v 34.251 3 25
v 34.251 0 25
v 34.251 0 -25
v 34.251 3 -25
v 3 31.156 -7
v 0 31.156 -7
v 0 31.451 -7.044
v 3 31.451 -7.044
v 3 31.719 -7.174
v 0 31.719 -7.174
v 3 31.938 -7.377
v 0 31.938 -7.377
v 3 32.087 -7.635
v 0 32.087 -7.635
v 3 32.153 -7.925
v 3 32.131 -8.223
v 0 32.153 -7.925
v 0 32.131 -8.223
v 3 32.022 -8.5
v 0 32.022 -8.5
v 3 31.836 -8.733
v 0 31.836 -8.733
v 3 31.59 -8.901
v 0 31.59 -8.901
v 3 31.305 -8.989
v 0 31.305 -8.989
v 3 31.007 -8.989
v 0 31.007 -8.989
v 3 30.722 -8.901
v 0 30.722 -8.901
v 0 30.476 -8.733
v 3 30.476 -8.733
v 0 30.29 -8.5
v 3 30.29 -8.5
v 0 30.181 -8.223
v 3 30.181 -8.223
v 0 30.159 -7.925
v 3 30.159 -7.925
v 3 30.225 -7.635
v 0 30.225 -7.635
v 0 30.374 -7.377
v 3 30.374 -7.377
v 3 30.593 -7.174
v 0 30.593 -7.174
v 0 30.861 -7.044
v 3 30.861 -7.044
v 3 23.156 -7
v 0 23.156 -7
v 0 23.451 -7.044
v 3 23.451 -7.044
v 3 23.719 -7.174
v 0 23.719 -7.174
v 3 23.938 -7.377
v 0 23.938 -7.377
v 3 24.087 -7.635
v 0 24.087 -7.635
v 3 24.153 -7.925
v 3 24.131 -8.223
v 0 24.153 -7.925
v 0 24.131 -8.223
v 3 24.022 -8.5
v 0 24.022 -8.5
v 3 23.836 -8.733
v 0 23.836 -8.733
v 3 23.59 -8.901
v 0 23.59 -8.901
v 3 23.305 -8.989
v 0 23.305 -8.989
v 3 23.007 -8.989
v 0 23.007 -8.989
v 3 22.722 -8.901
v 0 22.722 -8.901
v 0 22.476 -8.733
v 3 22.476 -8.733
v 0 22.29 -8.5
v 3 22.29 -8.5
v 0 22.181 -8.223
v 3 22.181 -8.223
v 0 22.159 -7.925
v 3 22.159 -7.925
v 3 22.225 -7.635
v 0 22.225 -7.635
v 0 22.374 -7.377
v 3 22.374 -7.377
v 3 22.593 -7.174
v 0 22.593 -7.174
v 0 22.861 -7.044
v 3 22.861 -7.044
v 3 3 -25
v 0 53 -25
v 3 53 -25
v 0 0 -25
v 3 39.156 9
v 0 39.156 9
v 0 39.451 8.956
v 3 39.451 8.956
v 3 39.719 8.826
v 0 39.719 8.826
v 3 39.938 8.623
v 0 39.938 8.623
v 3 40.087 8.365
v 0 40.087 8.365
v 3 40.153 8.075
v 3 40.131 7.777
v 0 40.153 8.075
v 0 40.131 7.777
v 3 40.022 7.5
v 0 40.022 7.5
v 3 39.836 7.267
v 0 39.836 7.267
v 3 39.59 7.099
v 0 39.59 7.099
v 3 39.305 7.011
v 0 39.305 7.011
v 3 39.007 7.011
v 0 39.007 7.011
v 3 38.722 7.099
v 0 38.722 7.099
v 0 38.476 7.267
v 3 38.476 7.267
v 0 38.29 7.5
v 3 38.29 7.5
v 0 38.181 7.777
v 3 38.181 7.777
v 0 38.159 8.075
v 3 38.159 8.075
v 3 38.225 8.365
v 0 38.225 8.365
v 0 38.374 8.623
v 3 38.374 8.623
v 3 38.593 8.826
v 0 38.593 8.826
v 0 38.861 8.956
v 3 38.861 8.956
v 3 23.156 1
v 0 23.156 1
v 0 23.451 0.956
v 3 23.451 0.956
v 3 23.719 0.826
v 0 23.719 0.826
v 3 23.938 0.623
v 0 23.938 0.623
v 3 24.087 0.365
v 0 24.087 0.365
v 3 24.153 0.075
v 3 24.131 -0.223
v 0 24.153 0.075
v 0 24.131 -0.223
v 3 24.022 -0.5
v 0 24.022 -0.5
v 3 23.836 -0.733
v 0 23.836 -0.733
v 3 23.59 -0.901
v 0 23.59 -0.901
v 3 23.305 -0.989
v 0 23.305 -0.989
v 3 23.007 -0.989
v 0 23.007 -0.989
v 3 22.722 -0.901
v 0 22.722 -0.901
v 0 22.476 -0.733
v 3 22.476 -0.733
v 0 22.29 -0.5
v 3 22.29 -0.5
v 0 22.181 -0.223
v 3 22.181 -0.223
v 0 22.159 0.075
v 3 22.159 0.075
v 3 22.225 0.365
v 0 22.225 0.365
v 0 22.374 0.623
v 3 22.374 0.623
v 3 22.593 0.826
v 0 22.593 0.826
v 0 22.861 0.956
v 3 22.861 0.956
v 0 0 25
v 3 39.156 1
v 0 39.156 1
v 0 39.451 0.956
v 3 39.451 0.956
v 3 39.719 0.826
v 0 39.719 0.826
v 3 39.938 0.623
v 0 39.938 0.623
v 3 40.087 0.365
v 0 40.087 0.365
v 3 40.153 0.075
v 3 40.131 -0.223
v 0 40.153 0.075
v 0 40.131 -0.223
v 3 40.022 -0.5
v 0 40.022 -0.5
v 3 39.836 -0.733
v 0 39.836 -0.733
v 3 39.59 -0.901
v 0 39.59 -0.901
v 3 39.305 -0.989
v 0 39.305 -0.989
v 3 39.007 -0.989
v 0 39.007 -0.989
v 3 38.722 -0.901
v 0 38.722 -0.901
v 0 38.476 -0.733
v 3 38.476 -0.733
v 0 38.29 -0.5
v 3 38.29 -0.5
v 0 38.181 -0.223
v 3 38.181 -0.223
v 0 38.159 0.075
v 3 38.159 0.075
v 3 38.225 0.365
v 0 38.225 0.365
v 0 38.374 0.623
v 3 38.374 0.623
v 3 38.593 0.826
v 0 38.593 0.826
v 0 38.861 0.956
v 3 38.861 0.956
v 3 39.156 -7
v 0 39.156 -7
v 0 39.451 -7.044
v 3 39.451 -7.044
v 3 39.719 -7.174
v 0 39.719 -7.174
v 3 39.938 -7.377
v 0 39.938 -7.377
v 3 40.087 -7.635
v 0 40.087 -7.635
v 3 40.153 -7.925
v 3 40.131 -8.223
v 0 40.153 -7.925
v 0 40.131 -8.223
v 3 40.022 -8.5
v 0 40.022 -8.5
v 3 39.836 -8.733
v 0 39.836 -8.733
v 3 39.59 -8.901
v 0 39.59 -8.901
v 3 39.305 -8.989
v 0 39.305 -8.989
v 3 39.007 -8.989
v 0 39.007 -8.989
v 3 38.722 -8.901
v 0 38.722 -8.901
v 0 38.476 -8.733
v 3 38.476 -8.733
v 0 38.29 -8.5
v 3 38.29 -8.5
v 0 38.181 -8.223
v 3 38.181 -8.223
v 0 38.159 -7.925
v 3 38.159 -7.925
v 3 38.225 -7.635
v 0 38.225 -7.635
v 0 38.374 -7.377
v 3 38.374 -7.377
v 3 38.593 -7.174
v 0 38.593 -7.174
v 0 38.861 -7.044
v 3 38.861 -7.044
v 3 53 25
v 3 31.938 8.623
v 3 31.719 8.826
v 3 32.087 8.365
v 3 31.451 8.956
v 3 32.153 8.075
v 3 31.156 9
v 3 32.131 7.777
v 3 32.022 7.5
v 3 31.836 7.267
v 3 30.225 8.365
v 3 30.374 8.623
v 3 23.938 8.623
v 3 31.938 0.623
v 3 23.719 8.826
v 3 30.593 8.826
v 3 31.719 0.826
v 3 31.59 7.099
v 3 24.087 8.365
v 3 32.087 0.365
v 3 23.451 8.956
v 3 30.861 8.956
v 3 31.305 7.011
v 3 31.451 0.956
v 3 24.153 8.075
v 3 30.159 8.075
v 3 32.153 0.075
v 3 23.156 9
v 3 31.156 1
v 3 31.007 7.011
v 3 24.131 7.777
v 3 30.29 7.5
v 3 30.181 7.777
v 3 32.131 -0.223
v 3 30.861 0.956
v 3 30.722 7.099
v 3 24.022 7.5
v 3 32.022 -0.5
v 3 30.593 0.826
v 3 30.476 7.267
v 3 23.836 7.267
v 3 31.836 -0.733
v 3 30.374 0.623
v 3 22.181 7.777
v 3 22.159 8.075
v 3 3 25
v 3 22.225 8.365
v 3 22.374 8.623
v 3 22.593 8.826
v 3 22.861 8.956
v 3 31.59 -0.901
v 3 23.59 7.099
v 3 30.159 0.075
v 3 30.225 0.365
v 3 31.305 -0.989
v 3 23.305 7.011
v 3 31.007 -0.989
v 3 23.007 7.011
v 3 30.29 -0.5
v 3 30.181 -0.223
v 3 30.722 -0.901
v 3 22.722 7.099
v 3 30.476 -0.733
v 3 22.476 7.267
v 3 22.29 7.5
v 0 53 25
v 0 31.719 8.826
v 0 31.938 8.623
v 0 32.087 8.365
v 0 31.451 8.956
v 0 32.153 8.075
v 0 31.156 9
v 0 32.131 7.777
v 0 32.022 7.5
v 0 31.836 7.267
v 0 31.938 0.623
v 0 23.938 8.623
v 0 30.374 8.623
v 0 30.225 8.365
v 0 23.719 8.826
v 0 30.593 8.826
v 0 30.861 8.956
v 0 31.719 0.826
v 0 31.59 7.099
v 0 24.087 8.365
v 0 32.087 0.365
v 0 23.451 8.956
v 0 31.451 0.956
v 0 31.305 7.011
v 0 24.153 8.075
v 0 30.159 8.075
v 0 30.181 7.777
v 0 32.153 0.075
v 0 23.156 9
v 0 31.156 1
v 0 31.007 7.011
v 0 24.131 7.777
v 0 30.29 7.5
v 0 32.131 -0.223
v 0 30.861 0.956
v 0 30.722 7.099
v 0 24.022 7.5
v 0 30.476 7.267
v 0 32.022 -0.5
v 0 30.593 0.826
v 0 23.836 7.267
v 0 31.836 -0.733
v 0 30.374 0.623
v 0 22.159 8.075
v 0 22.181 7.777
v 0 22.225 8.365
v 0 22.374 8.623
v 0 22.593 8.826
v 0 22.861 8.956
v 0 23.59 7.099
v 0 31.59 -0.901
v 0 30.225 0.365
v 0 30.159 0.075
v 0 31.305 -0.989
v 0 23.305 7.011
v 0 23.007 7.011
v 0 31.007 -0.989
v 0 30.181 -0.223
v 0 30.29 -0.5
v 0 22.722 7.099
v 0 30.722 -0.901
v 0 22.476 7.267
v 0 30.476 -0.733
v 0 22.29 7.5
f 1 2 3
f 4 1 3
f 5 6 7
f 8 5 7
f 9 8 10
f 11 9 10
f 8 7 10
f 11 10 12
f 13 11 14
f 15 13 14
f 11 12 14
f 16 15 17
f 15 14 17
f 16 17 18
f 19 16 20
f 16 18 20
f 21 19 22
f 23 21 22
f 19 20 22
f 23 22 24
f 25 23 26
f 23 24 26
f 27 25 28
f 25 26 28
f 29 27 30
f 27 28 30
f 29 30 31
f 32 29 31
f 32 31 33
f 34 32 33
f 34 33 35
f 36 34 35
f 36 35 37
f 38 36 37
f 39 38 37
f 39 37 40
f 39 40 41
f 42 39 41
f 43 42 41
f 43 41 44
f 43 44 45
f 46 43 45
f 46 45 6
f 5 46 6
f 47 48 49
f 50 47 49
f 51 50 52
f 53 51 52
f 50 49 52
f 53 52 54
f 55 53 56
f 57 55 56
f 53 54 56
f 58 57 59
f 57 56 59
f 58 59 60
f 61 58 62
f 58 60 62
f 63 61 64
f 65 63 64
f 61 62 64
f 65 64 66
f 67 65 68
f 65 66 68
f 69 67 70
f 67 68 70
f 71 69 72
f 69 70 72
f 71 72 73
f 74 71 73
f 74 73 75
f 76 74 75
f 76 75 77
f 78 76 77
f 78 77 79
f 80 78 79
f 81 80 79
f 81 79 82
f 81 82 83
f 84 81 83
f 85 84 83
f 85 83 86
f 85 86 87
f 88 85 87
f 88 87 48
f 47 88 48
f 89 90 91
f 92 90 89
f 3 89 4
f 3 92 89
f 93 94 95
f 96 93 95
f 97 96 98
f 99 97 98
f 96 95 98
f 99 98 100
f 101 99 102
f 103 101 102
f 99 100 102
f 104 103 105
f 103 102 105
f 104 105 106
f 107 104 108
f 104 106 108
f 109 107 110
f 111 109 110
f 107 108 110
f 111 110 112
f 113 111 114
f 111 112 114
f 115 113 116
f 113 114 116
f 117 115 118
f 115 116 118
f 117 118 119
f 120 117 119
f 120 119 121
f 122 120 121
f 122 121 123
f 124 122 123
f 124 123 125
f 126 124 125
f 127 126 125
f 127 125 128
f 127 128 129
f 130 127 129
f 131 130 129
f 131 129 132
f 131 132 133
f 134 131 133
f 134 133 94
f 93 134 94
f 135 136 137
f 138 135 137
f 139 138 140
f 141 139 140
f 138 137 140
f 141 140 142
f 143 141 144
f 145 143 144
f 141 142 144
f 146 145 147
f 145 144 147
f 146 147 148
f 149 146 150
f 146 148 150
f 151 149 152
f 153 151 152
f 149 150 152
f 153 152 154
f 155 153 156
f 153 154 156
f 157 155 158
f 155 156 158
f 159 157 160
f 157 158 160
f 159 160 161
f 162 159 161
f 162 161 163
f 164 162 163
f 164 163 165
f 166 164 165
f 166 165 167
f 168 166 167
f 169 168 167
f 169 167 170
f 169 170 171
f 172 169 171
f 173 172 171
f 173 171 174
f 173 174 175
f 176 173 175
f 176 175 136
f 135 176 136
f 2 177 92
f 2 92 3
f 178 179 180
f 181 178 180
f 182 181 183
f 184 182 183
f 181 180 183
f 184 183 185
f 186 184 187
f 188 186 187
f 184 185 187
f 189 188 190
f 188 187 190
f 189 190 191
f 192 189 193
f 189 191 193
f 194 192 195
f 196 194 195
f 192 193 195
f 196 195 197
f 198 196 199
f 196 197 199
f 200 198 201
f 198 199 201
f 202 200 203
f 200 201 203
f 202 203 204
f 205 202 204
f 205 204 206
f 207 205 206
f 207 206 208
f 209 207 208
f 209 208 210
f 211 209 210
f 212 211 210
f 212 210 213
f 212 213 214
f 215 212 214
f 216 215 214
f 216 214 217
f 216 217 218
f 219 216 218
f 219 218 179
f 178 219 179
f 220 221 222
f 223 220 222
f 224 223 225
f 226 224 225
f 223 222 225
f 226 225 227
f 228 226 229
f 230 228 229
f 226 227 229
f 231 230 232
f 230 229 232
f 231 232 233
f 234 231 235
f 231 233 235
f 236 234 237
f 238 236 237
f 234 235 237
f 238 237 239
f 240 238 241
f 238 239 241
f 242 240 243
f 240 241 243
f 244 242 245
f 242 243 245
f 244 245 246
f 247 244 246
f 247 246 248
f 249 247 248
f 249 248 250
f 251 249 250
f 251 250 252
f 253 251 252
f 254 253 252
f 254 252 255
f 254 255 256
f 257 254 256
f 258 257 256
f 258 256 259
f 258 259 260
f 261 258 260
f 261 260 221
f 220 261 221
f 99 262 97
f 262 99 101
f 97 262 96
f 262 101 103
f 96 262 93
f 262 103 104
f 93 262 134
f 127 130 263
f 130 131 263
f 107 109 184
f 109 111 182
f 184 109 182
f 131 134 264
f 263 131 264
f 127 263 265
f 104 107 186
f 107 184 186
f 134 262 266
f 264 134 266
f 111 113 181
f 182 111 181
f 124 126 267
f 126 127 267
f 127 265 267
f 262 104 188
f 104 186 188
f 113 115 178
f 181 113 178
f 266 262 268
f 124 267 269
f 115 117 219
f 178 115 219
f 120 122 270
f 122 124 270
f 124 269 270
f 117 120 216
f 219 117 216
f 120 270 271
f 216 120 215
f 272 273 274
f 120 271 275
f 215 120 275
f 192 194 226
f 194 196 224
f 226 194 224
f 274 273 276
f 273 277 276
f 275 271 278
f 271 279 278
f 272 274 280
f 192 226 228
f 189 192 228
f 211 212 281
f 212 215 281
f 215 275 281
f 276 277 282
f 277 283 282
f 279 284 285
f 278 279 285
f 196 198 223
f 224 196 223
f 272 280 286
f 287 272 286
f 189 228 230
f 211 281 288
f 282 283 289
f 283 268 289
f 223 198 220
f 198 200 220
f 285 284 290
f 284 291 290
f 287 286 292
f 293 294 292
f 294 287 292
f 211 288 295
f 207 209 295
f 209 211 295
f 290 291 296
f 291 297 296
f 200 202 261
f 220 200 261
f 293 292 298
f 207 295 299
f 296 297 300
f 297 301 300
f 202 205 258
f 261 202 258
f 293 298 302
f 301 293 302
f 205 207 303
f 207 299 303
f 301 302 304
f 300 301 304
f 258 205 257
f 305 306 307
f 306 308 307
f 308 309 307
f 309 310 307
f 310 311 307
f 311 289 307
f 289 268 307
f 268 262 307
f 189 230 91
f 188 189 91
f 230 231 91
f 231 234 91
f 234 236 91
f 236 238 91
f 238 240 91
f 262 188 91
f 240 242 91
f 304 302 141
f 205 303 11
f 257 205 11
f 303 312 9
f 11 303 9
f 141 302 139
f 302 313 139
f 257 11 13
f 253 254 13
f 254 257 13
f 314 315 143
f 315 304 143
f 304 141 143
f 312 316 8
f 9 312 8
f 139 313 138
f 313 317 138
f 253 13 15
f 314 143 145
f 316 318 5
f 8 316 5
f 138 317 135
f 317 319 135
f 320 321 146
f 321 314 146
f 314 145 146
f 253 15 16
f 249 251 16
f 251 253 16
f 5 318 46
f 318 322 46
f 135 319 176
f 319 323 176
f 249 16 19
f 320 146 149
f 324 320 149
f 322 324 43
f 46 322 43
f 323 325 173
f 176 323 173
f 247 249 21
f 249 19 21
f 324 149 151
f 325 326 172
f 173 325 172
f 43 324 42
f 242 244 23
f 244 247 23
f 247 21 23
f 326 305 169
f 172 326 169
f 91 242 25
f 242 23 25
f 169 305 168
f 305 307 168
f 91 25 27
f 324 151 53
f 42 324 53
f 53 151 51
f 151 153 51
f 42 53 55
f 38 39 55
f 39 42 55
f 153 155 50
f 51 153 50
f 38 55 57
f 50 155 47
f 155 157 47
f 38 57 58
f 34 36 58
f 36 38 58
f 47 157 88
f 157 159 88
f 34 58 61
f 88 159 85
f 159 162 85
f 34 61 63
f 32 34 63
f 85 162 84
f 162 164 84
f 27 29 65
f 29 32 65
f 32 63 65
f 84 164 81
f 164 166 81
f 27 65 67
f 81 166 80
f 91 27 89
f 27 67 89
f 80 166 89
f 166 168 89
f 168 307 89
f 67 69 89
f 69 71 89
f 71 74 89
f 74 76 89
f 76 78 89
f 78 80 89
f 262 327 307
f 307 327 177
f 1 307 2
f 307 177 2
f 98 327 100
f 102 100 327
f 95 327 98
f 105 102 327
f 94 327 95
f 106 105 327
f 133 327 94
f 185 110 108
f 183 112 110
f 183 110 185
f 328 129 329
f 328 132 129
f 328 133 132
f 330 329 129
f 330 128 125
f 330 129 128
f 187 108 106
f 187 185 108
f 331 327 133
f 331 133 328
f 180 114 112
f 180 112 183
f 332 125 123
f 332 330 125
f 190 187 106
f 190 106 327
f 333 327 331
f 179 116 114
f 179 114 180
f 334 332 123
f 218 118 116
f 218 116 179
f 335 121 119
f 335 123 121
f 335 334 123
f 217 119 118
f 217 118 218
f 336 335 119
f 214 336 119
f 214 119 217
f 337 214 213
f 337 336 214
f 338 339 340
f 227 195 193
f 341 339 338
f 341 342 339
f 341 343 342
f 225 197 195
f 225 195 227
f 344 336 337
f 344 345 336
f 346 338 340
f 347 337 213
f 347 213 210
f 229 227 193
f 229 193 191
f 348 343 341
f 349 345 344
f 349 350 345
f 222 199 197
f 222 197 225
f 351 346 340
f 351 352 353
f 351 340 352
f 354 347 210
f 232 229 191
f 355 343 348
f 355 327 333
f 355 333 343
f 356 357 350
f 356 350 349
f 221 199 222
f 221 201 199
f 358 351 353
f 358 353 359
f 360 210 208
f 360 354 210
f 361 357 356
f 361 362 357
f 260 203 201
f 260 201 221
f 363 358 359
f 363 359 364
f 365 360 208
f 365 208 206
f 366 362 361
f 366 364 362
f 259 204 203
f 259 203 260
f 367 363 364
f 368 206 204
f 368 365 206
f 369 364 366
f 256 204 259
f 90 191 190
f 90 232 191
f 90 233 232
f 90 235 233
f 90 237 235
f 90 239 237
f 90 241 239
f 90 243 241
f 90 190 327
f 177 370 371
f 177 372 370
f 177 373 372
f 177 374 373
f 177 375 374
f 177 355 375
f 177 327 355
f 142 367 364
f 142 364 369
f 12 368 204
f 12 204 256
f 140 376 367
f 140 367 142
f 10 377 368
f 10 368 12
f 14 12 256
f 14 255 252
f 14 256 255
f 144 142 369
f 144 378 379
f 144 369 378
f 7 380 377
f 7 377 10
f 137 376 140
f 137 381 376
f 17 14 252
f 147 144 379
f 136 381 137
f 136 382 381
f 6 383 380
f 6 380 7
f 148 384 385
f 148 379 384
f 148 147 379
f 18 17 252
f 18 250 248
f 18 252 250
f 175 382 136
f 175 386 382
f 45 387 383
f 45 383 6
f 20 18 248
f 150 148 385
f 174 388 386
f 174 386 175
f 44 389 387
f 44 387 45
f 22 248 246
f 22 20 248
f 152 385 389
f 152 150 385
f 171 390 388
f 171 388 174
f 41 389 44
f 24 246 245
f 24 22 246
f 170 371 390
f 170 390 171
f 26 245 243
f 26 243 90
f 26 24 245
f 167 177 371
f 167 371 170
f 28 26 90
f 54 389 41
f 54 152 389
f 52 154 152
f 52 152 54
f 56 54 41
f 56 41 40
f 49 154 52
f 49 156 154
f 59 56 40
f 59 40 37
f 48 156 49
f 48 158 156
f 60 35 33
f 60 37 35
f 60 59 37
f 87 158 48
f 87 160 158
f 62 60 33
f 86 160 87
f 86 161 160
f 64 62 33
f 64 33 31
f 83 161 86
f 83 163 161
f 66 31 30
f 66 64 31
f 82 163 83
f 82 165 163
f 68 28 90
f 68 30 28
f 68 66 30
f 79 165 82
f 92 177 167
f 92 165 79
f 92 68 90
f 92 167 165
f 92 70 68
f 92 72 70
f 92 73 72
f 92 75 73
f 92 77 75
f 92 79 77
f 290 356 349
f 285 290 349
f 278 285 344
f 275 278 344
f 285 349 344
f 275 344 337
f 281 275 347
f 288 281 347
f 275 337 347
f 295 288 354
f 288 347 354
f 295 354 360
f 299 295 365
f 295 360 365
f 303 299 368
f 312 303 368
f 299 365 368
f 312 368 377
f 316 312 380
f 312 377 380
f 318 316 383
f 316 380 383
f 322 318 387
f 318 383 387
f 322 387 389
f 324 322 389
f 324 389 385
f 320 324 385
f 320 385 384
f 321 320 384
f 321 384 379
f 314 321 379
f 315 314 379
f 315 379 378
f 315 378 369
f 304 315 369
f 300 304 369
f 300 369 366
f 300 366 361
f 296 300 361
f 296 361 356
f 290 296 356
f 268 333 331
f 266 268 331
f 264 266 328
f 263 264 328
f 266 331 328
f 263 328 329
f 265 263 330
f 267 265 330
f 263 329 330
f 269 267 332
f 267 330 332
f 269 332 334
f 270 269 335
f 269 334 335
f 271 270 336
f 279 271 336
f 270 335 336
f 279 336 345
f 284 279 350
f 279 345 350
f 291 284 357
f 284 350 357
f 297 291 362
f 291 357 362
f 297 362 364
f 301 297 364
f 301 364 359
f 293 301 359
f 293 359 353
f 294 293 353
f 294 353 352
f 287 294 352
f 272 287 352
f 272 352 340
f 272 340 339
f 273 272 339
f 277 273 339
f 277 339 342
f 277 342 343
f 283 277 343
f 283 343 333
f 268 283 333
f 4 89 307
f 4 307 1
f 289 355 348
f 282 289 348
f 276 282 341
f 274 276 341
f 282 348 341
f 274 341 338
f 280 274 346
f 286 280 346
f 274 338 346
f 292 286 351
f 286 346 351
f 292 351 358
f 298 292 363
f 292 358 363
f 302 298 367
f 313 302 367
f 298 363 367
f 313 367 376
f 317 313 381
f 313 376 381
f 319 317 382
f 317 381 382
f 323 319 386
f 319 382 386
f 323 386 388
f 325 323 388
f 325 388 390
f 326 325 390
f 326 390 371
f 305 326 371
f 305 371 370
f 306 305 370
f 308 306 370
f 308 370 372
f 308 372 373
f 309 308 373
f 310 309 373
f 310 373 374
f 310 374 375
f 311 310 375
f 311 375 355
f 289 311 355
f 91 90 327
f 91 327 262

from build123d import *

# Parameters (mm, degrees)
SKETCH_1_W                       = 34.251173864
SKETCH_1_H                       = 50
EXTRUDE_1_DEPTH                  = 3
SKETCH_2_W                       = 3
SKETCH_2_H                       = 50
EXTRUDE_2_DEPTH                  = 50
SKETCH_3_R                       = 1
CUT_EXTRUDE_1_DEPTH              = 50
PATTERN_LINEAR_1_COUNT           = 3
PATTERN_LINEAR_1_PITCH           = 8
PATTERN_LINEAR_2_COUNT           = 3
PATTERN_LINEAR_2_PITCH           = 8
PATTERN_LINEAR_2_COPY_1_SKETCH_R = 1
PATTERN_LINEAR_2_COPY_1_DEPTH    = 50
PATTERN_LINEAR_2_COPY_2_SKETCH_R = 1
PATTERN_LINEAR_2_COPY_2_DEPTH    = 50
PATTERN_LINEAR_2_COPY_3_SKETCH_R = 1
PATTERN_LINEAR_2_COPY_3_DEPTH    = 50
PATTERN_LINEAR_2_COPY_4_SKETCH_R = 1
PATTERN_LINEAR_2_COPY_4_DEPTH    = 50


with BuildPart() as part:
    # 草图1 → 凸台-拉伸1 (new body)
    with BuildSketch(Plane(origin=(0, 0, 0), x_dir=(1, 0, 0), z_dir=(0, 1, 0))):
        with Locations((17.125586932, 0)):
            Rectangle(SKETCH_1_W, SKETCH_1_H)
    extrude(amount=EXTRUDE_1_DEPTH)

    # 草图2 → 凸台-拉伸2 (add)
    with BuildSketch(Plane(origin=(0, 3, 0), x_dir=(1, 0, 0), z_dir=(0, 1, 0))):
        with Locations((1.5, 0)):
            Rectangle(SKETCH_2_W, SKETCH_2_H)
    extrude(amount=EXTRUDE_2_DEPTH)

    # 草图3 → 切除-拉伸1 (cut)
    with BuildSketch(Plane.ZY):
        with Locations((-8, 39.156069013)):
            Circle(SKETCH_3_R)
    cut_extrude_1 = extrude(amount=-CUT_EXTRUDE_1_DEPTH, mode=Mode.SUBTRACT)

    # 阵列(线性)1: 切除-拉伸1 ×3
    with Locations(*[(0, 0, i * PATTERN_LINEAR_1_PITCH) for i in range(1, PATTERN_LINEAR_1_COUNT)]):
        add(cut_extrude_1, mode=Mode.SUBTRACT)

    # 阵列(线性)2: 切除-拉伸1 ×3
    with Locations(*[(0, -i * PATTERN_LINEAR_2_PITCH, 0) for i in range(1, PATTERN_LINEAR_2_COUNT)]):
        add(cut_extrude_1, mode=Mode.SUBTRACT)

    # 阵列(线性)2 copy 1 sketch → 阵列(线性)2 copy 1 (cut)
    with BuildSketch(Plane(origin=(0, -8, 8), x_dir=(0, 0, 1), z_dir=(-1, 0, 0))):
        with Locations((-8, 39.156069013)):
            Circle(PATTERN_LINEAR_2_COPY_1_SKETCH_R)
    extrude(amount=-PATTERN_LINEAR_2_COPY_1_DEPTH, mode=Mode.SUBTRACT)

    # 阵列(线性)2 copy 2 sketch → 阵列(线性)2 copy 2 (cut)
    with BuildSketch(Plane(origin=(0, -16, 8), x_dir=(0, 0, 1), z_dir=(-1, 0, 0))):
        with Locations((-8, 39.156069013)):
            Circle(PATTERN_LINEAR_2_COPY_2_SKETCH_R)
    extrude(amount=-PATTERN_LINEAR_2_COPY_2_DEPTH, mode=Mode.SUBTRACT)

    # 阵列(线性)2 copy 3 sketch → 阵列(线性)2 copy 3 (cut)
    with BuildSketch(Plane(origin=(0, -8, 16), x_dir=(0, 0, 1), z_dir=(-1, 0, 0))):
        with Locations((-8, 39.156069013)):
            Circle(PATTERN_LINEAR_2_COPY_3_SKETCH_R)
    extrude(amount=-PATTERN_LINEAR_2_COPY_3_DEPTH, mode=Mode.SUBTRACT)

    # 阵列(线性)2 copy 4 sketch → 阵列(线性)2 copy 4 (cut)
    with BuildSketch(Plane(origin=(0, -16, 16), x_dir=(0, 0, 1), z_dir=(-1, 0, 0))):
        with Locations((-8, 39.156069013)):
            Circle(PATTERN_LINEAR_2_COPY_4_SKETCH_R)
    extrude(amount=-PATTERN_LINEAR_2_COPY_4_DEPTH, mode=Mode.SUBTRACT)


solid = part.part
